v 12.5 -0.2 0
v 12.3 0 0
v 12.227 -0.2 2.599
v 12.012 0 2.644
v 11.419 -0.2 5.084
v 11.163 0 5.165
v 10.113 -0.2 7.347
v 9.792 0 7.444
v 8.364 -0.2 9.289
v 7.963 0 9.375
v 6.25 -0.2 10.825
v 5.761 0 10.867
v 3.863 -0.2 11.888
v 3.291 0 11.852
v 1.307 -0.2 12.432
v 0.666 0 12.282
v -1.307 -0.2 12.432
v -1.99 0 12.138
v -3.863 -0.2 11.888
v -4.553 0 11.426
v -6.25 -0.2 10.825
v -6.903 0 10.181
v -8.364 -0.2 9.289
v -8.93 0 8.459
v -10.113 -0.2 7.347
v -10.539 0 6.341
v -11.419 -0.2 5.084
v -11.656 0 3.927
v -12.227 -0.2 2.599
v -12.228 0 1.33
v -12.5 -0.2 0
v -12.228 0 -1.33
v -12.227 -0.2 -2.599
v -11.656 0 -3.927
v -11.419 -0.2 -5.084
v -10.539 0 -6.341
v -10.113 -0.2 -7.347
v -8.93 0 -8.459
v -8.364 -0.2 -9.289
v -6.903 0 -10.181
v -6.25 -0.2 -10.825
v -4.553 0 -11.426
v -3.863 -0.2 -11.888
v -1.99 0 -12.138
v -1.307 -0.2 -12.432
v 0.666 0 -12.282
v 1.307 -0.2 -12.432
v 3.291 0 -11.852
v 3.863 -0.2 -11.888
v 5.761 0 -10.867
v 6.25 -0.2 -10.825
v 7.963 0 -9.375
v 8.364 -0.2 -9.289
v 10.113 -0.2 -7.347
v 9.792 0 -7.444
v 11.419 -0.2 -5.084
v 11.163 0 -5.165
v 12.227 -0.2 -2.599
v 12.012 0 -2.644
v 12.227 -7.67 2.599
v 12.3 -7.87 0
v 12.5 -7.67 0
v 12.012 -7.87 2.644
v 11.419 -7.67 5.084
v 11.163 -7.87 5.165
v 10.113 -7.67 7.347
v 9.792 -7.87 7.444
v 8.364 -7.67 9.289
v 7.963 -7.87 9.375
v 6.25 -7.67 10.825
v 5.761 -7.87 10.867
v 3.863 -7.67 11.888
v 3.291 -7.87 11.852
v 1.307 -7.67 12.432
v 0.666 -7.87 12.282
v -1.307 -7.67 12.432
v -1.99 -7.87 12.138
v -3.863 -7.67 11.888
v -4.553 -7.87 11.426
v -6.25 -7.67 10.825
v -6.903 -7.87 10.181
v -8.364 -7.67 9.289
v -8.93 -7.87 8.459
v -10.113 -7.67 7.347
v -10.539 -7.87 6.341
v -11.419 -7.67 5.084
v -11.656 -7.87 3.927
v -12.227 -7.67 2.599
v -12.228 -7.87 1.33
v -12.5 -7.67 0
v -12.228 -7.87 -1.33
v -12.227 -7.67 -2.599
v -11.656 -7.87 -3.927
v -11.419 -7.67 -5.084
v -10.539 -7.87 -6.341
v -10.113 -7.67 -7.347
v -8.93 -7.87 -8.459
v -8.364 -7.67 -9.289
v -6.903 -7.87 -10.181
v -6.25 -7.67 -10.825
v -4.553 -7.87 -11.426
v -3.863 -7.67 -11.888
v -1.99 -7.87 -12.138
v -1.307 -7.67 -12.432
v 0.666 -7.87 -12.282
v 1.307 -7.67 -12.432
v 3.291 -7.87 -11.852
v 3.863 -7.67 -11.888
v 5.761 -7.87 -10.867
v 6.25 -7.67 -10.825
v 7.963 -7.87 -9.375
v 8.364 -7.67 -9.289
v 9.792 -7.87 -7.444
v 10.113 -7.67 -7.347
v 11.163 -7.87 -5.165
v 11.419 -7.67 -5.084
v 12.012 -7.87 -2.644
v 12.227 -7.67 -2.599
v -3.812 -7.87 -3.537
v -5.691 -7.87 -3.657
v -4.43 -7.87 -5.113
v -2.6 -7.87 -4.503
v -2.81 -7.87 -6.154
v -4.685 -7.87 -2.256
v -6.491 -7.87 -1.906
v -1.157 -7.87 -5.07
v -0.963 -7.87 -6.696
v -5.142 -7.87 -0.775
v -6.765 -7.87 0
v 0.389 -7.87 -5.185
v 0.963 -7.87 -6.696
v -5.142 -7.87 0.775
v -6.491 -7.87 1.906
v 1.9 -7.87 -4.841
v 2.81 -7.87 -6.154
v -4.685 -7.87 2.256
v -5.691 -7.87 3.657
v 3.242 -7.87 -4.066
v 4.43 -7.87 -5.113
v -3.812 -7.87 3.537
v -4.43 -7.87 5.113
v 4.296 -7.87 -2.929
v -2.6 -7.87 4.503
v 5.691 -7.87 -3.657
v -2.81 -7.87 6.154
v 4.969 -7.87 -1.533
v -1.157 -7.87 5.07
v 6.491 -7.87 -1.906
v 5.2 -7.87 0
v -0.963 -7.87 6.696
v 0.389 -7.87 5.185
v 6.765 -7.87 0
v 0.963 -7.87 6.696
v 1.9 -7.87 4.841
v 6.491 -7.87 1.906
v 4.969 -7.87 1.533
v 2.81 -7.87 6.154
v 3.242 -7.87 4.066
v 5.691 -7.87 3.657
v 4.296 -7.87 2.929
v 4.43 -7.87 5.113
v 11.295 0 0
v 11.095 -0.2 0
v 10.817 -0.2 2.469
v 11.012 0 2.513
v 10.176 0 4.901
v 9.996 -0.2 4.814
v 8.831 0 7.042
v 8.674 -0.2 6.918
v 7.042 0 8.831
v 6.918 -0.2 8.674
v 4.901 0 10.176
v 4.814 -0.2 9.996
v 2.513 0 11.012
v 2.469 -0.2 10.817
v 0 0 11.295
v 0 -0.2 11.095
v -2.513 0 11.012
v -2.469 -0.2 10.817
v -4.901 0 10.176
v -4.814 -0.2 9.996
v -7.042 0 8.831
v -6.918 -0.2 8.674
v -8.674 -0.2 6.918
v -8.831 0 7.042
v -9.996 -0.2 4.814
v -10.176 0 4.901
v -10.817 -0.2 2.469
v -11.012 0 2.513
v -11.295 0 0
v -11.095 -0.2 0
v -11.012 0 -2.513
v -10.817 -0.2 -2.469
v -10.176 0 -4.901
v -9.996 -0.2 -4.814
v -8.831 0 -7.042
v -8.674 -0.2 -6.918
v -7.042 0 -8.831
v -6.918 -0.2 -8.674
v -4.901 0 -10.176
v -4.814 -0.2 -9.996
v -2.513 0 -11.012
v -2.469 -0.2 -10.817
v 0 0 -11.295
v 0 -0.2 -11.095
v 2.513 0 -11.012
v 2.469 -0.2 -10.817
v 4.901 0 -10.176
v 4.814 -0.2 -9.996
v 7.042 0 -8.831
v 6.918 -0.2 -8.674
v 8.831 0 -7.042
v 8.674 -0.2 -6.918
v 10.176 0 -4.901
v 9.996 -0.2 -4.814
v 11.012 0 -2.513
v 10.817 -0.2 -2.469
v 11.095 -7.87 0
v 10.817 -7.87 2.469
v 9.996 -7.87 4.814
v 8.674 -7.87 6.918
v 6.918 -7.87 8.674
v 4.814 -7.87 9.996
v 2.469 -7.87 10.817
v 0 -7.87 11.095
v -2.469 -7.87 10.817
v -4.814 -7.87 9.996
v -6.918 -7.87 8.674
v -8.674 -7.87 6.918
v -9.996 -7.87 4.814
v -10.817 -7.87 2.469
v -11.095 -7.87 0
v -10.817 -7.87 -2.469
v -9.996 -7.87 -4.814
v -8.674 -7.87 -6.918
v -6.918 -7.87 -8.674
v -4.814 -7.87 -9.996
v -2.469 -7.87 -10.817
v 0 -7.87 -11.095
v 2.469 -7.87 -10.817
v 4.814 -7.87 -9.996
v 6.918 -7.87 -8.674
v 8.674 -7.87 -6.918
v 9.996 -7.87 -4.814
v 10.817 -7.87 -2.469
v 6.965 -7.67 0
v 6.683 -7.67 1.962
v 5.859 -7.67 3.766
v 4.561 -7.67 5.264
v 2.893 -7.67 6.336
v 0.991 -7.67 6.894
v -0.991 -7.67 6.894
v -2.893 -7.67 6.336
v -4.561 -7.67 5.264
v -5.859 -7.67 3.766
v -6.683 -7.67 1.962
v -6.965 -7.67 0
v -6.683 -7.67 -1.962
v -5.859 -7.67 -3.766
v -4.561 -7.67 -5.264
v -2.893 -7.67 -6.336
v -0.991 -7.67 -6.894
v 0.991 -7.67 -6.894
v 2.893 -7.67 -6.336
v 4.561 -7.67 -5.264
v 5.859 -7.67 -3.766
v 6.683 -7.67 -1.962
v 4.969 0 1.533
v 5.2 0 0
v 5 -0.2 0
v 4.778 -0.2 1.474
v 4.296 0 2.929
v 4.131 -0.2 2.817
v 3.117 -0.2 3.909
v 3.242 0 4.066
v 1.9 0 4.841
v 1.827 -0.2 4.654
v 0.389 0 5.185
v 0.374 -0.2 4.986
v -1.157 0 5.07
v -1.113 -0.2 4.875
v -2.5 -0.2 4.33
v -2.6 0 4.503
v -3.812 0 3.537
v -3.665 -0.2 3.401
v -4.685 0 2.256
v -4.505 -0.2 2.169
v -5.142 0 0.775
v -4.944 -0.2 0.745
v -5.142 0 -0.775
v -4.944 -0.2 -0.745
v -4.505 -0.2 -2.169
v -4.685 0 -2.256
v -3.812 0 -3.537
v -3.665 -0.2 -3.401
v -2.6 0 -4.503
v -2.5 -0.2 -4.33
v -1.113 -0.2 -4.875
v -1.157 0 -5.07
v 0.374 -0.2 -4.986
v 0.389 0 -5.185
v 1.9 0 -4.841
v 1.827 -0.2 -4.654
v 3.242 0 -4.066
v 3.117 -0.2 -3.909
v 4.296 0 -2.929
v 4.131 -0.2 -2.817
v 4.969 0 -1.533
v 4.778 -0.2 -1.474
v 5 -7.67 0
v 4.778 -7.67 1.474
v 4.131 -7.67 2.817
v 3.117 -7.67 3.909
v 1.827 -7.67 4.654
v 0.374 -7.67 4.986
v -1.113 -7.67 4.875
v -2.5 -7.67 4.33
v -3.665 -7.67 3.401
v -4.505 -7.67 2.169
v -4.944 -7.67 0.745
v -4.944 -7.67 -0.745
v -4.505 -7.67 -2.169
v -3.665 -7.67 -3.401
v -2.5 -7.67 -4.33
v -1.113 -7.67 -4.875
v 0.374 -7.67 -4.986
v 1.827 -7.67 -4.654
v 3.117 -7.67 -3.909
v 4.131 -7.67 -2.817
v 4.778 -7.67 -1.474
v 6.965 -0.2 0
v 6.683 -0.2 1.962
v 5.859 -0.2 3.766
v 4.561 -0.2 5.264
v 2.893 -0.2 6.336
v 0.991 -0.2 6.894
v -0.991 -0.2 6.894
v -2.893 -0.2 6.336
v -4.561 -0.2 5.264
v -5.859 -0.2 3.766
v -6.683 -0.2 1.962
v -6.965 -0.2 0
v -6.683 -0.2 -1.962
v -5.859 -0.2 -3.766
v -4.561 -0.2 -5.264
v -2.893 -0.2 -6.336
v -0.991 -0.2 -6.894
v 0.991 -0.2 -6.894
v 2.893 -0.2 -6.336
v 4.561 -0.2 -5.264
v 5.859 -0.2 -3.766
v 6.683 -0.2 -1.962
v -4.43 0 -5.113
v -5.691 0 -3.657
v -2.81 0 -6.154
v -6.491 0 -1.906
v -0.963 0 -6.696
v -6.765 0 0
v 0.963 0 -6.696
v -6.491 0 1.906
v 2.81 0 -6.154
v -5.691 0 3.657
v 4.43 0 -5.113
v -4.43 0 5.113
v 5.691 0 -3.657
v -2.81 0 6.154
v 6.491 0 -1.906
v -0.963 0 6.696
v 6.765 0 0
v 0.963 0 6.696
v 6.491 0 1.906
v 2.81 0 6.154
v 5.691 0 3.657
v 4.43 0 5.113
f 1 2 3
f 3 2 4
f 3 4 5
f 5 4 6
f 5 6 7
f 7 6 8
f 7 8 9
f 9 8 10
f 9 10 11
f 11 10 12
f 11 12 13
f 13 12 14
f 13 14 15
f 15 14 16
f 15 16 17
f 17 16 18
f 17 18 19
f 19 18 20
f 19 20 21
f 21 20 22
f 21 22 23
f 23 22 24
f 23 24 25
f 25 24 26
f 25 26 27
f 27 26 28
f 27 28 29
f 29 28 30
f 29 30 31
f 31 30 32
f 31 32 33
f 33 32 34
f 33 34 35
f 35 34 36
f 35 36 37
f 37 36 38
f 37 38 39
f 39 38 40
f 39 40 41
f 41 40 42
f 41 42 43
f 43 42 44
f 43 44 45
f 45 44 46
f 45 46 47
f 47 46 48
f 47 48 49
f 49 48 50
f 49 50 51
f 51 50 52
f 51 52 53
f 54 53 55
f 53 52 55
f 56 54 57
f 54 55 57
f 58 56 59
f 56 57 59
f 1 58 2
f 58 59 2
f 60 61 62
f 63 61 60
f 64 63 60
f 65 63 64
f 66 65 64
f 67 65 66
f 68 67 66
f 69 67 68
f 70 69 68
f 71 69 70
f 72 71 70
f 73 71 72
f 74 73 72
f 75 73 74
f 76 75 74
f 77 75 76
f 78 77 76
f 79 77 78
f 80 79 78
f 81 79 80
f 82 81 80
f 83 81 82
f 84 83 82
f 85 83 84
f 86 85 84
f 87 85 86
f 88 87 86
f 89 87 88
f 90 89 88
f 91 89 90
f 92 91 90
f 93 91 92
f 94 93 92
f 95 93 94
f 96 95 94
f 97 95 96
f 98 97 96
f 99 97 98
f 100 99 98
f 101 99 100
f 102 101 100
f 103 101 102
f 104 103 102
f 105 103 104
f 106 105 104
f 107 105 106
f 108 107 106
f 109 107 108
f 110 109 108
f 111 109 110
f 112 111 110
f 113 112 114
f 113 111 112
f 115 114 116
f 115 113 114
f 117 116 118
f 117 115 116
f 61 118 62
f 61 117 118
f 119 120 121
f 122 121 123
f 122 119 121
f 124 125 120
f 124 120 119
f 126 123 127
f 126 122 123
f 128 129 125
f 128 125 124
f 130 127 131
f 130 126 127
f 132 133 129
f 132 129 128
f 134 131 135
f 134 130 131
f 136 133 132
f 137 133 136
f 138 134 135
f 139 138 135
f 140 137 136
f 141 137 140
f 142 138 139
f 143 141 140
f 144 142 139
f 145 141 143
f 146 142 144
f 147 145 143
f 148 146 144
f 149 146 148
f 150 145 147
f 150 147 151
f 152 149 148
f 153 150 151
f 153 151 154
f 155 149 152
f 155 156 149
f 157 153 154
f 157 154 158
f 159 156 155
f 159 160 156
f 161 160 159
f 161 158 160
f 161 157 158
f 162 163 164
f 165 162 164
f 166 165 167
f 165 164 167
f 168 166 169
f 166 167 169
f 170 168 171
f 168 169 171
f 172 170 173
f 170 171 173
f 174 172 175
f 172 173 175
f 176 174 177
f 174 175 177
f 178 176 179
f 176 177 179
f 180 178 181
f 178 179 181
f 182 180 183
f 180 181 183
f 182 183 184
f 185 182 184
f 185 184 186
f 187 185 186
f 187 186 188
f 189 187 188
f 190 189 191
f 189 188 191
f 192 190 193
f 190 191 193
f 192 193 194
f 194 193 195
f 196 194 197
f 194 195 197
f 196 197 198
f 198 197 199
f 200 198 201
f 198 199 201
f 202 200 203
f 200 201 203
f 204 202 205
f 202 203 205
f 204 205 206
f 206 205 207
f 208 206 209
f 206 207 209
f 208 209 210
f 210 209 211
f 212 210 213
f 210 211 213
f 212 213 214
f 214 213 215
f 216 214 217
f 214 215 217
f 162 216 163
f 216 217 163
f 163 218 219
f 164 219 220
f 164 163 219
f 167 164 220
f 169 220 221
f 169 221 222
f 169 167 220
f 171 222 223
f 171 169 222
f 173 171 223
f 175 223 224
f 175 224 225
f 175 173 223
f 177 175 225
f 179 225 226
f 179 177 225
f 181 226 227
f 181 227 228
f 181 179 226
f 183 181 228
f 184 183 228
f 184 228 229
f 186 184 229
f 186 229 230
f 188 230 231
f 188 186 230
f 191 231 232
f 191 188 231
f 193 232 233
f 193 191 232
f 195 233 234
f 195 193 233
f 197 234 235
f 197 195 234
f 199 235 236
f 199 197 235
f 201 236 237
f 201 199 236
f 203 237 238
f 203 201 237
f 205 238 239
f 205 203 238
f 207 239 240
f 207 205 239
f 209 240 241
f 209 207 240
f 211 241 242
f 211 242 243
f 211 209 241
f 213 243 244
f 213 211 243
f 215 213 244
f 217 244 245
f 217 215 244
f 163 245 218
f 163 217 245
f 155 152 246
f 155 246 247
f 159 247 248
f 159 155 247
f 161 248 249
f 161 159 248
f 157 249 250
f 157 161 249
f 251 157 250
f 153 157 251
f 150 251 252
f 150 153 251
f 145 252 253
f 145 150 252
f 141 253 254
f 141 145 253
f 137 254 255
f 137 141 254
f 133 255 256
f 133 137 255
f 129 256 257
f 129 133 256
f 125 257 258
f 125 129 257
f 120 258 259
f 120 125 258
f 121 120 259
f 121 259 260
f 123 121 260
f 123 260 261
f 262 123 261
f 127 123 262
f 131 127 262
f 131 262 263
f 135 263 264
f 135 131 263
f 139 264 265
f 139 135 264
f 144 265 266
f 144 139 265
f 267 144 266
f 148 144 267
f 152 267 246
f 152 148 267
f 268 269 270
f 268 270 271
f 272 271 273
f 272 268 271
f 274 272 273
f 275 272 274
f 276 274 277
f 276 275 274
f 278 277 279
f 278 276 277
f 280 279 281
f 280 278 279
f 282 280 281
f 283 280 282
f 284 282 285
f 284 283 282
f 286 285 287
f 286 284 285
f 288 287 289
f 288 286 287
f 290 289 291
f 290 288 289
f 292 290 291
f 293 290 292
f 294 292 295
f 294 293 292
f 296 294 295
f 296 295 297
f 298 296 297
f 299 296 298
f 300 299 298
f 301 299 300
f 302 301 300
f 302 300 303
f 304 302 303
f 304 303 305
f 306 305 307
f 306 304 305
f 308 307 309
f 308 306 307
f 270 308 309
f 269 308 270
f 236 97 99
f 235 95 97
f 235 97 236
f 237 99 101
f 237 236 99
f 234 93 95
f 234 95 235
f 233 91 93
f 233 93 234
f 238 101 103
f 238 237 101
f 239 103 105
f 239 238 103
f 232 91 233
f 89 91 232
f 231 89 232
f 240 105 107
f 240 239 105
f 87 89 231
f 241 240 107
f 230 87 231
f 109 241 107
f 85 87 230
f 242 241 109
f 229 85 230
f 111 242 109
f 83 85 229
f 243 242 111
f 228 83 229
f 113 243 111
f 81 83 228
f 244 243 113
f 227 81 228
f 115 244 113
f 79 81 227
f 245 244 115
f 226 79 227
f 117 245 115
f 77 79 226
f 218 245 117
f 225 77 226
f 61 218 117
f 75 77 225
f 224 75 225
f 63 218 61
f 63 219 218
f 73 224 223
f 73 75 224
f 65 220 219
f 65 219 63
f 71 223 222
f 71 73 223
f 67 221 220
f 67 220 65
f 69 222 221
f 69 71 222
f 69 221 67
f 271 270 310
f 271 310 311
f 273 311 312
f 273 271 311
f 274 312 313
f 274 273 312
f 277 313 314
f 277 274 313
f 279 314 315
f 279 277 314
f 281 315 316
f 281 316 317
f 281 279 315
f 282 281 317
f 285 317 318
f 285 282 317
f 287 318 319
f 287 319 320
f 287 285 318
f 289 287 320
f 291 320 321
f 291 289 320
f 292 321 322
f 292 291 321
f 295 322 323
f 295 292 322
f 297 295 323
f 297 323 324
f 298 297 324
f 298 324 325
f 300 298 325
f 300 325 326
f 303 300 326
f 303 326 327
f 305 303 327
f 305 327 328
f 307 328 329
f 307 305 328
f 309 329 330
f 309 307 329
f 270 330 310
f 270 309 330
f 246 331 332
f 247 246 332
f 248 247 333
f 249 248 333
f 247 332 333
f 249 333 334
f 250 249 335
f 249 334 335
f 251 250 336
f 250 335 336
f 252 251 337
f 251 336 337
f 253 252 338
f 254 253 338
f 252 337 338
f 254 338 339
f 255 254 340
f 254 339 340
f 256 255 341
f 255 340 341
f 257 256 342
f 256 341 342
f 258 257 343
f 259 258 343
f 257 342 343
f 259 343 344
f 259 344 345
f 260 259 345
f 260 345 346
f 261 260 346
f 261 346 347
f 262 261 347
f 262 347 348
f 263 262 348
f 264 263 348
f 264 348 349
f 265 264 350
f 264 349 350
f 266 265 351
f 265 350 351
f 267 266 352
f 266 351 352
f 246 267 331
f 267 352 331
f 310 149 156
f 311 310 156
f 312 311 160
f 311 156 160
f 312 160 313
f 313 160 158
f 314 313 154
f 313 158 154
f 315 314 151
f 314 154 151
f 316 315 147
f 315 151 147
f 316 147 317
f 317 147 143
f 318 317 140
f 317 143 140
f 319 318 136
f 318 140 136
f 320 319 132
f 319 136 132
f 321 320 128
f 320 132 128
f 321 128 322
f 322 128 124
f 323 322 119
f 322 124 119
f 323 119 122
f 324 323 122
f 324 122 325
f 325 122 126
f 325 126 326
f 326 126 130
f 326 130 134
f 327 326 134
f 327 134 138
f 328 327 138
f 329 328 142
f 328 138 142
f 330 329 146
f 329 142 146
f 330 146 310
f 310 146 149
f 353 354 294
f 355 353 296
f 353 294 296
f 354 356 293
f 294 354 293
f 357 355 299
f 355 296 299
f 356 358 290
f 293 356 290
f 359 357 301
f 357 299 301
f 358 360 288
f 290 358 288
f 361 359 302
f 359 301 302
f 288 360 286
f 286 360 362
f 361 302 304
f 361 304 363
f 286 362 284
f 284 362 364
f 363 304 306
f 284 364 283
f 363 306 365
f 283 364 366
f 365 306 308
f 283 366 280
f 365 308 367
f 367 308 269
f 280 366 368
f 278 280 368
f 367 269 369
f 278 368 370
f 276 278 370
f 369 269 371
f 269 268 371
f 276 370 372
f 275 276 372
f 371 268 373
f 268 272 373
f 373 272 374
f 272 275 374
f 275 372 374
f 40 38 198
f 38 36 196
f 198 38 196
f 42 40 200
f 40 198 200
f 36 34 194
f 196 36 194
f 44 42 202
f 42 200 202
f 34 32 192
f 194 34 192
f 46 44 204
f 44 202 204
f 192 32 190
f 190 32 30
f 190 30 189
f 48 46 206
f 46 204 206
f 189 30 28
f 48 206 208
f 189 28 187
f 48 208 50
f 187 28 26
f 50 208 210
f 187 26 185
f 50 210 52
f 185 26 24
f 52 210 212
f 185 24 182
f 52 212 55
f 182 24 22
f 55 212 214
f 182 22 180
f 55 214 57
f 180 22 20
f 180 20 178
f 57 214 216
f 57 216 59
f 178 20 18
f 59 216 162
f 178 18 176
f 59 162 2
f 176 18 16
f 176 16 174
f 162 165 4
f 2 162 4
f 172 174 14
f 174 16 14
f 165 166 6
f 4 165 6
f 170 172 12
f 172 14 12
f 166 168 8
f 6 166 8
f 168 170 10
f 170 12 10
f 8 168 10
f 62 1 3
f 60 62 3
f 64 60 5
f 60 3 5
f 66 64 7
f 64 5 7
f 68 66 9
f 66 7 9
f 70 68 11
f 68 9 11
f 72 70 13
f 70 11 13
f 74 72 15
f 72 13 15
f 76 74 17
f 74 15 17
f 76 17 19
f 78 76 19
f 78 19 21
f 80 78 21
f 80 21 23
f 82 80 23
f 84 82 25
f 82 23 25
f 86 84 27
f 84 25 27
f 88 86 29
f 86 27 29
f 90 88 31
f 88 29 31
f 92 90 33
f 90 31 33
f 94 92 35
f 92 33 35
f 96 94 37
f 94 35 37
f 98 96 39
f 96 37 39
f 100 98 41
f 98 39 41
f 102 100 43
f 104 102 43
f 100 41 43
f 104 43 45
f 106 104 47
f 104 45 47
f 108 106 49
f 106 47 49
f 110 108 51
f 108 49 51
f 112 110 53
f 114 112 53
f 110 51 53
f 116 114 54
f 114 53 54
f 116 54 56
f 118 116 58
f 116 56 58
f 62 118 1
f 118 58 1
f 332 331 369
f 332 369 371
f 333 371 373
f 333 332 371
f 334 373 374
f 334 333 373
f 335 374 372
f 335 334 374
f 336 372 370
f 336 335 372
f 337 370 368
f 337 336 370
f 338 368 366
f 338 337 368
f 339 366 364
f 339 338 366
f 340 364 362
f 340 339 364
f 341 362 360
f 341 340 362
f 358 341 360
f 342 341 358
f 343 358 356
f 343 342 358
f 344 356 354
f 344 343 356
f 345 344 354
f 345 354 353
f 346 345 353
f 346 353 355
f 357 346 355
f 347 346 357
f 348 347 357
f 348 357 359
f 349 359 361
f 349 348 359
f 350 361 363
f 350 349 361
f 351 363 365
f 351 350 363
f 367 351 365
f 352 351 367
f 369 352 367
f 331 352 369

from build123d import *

# Parameters (mm, degrees)
F0_R     = 12.5
F0_R_2   = 11.095
F0_R_3   = 6.965
F0_R_4   = 5
F1_DEPTH = 7.87
F2_SIZE  = 0.2
F3_SIZE  = 0.2
F4_SIZE  = 0.2
F5_SIZE  = 0.2
F6_SIZE  = 0.2


with BuildPart() as f1:
    # F0 (on Front) → F1 (new body)
    with BuildSketch(Plane.XZ):
        Circle(F0_R)
        Circle(F0_R_2, mode=Mode.SUBTRACT)
        Circle(F0_R_3)
        Circle(F0_R_4, mode=Mode.SUBTRACT)
    extrude(amount=F1_DEPTH)

    # F2
    f2_edges = [f1.edges().sort_by_distance(p)[0] for p in [
        (-5, -7.87, 0),
    ]]
    chamfer(f2_edges, length=F2_SIZE)

    # F3
    f3_edges = [f1.edges().sort_by_distance(p)[0] for p in [
        (-5, 0, 0),
    ]]
    chamfer(f3_edges, length=F3_SIZE)

    # F4
    f4_edges = [f1.edges().sort_by_distance(p)[0] for p in [
        (-12.5, -7.87, 0),
        (-12.5, 0, 0),
    ]]
    chamfer(f4_edges, length=F4_SIZE)

    # F5
    f5_edges = [f1.edges().sort_by_distance(p)[0] for p in [
        (-11.095, 0, 0),
        (-6.965, 0, 0),
    ]]
    chamfer(f5_edges, length=F5_SIZE)

    # F6
    f6_edges = [f1.edges().sort_by_distance(p)[0] for p in [
        (-6.965, -7.87, 0),
    ]]
    chamfer(f6_edges, length=F6_SIZE)


solid = f1.part
